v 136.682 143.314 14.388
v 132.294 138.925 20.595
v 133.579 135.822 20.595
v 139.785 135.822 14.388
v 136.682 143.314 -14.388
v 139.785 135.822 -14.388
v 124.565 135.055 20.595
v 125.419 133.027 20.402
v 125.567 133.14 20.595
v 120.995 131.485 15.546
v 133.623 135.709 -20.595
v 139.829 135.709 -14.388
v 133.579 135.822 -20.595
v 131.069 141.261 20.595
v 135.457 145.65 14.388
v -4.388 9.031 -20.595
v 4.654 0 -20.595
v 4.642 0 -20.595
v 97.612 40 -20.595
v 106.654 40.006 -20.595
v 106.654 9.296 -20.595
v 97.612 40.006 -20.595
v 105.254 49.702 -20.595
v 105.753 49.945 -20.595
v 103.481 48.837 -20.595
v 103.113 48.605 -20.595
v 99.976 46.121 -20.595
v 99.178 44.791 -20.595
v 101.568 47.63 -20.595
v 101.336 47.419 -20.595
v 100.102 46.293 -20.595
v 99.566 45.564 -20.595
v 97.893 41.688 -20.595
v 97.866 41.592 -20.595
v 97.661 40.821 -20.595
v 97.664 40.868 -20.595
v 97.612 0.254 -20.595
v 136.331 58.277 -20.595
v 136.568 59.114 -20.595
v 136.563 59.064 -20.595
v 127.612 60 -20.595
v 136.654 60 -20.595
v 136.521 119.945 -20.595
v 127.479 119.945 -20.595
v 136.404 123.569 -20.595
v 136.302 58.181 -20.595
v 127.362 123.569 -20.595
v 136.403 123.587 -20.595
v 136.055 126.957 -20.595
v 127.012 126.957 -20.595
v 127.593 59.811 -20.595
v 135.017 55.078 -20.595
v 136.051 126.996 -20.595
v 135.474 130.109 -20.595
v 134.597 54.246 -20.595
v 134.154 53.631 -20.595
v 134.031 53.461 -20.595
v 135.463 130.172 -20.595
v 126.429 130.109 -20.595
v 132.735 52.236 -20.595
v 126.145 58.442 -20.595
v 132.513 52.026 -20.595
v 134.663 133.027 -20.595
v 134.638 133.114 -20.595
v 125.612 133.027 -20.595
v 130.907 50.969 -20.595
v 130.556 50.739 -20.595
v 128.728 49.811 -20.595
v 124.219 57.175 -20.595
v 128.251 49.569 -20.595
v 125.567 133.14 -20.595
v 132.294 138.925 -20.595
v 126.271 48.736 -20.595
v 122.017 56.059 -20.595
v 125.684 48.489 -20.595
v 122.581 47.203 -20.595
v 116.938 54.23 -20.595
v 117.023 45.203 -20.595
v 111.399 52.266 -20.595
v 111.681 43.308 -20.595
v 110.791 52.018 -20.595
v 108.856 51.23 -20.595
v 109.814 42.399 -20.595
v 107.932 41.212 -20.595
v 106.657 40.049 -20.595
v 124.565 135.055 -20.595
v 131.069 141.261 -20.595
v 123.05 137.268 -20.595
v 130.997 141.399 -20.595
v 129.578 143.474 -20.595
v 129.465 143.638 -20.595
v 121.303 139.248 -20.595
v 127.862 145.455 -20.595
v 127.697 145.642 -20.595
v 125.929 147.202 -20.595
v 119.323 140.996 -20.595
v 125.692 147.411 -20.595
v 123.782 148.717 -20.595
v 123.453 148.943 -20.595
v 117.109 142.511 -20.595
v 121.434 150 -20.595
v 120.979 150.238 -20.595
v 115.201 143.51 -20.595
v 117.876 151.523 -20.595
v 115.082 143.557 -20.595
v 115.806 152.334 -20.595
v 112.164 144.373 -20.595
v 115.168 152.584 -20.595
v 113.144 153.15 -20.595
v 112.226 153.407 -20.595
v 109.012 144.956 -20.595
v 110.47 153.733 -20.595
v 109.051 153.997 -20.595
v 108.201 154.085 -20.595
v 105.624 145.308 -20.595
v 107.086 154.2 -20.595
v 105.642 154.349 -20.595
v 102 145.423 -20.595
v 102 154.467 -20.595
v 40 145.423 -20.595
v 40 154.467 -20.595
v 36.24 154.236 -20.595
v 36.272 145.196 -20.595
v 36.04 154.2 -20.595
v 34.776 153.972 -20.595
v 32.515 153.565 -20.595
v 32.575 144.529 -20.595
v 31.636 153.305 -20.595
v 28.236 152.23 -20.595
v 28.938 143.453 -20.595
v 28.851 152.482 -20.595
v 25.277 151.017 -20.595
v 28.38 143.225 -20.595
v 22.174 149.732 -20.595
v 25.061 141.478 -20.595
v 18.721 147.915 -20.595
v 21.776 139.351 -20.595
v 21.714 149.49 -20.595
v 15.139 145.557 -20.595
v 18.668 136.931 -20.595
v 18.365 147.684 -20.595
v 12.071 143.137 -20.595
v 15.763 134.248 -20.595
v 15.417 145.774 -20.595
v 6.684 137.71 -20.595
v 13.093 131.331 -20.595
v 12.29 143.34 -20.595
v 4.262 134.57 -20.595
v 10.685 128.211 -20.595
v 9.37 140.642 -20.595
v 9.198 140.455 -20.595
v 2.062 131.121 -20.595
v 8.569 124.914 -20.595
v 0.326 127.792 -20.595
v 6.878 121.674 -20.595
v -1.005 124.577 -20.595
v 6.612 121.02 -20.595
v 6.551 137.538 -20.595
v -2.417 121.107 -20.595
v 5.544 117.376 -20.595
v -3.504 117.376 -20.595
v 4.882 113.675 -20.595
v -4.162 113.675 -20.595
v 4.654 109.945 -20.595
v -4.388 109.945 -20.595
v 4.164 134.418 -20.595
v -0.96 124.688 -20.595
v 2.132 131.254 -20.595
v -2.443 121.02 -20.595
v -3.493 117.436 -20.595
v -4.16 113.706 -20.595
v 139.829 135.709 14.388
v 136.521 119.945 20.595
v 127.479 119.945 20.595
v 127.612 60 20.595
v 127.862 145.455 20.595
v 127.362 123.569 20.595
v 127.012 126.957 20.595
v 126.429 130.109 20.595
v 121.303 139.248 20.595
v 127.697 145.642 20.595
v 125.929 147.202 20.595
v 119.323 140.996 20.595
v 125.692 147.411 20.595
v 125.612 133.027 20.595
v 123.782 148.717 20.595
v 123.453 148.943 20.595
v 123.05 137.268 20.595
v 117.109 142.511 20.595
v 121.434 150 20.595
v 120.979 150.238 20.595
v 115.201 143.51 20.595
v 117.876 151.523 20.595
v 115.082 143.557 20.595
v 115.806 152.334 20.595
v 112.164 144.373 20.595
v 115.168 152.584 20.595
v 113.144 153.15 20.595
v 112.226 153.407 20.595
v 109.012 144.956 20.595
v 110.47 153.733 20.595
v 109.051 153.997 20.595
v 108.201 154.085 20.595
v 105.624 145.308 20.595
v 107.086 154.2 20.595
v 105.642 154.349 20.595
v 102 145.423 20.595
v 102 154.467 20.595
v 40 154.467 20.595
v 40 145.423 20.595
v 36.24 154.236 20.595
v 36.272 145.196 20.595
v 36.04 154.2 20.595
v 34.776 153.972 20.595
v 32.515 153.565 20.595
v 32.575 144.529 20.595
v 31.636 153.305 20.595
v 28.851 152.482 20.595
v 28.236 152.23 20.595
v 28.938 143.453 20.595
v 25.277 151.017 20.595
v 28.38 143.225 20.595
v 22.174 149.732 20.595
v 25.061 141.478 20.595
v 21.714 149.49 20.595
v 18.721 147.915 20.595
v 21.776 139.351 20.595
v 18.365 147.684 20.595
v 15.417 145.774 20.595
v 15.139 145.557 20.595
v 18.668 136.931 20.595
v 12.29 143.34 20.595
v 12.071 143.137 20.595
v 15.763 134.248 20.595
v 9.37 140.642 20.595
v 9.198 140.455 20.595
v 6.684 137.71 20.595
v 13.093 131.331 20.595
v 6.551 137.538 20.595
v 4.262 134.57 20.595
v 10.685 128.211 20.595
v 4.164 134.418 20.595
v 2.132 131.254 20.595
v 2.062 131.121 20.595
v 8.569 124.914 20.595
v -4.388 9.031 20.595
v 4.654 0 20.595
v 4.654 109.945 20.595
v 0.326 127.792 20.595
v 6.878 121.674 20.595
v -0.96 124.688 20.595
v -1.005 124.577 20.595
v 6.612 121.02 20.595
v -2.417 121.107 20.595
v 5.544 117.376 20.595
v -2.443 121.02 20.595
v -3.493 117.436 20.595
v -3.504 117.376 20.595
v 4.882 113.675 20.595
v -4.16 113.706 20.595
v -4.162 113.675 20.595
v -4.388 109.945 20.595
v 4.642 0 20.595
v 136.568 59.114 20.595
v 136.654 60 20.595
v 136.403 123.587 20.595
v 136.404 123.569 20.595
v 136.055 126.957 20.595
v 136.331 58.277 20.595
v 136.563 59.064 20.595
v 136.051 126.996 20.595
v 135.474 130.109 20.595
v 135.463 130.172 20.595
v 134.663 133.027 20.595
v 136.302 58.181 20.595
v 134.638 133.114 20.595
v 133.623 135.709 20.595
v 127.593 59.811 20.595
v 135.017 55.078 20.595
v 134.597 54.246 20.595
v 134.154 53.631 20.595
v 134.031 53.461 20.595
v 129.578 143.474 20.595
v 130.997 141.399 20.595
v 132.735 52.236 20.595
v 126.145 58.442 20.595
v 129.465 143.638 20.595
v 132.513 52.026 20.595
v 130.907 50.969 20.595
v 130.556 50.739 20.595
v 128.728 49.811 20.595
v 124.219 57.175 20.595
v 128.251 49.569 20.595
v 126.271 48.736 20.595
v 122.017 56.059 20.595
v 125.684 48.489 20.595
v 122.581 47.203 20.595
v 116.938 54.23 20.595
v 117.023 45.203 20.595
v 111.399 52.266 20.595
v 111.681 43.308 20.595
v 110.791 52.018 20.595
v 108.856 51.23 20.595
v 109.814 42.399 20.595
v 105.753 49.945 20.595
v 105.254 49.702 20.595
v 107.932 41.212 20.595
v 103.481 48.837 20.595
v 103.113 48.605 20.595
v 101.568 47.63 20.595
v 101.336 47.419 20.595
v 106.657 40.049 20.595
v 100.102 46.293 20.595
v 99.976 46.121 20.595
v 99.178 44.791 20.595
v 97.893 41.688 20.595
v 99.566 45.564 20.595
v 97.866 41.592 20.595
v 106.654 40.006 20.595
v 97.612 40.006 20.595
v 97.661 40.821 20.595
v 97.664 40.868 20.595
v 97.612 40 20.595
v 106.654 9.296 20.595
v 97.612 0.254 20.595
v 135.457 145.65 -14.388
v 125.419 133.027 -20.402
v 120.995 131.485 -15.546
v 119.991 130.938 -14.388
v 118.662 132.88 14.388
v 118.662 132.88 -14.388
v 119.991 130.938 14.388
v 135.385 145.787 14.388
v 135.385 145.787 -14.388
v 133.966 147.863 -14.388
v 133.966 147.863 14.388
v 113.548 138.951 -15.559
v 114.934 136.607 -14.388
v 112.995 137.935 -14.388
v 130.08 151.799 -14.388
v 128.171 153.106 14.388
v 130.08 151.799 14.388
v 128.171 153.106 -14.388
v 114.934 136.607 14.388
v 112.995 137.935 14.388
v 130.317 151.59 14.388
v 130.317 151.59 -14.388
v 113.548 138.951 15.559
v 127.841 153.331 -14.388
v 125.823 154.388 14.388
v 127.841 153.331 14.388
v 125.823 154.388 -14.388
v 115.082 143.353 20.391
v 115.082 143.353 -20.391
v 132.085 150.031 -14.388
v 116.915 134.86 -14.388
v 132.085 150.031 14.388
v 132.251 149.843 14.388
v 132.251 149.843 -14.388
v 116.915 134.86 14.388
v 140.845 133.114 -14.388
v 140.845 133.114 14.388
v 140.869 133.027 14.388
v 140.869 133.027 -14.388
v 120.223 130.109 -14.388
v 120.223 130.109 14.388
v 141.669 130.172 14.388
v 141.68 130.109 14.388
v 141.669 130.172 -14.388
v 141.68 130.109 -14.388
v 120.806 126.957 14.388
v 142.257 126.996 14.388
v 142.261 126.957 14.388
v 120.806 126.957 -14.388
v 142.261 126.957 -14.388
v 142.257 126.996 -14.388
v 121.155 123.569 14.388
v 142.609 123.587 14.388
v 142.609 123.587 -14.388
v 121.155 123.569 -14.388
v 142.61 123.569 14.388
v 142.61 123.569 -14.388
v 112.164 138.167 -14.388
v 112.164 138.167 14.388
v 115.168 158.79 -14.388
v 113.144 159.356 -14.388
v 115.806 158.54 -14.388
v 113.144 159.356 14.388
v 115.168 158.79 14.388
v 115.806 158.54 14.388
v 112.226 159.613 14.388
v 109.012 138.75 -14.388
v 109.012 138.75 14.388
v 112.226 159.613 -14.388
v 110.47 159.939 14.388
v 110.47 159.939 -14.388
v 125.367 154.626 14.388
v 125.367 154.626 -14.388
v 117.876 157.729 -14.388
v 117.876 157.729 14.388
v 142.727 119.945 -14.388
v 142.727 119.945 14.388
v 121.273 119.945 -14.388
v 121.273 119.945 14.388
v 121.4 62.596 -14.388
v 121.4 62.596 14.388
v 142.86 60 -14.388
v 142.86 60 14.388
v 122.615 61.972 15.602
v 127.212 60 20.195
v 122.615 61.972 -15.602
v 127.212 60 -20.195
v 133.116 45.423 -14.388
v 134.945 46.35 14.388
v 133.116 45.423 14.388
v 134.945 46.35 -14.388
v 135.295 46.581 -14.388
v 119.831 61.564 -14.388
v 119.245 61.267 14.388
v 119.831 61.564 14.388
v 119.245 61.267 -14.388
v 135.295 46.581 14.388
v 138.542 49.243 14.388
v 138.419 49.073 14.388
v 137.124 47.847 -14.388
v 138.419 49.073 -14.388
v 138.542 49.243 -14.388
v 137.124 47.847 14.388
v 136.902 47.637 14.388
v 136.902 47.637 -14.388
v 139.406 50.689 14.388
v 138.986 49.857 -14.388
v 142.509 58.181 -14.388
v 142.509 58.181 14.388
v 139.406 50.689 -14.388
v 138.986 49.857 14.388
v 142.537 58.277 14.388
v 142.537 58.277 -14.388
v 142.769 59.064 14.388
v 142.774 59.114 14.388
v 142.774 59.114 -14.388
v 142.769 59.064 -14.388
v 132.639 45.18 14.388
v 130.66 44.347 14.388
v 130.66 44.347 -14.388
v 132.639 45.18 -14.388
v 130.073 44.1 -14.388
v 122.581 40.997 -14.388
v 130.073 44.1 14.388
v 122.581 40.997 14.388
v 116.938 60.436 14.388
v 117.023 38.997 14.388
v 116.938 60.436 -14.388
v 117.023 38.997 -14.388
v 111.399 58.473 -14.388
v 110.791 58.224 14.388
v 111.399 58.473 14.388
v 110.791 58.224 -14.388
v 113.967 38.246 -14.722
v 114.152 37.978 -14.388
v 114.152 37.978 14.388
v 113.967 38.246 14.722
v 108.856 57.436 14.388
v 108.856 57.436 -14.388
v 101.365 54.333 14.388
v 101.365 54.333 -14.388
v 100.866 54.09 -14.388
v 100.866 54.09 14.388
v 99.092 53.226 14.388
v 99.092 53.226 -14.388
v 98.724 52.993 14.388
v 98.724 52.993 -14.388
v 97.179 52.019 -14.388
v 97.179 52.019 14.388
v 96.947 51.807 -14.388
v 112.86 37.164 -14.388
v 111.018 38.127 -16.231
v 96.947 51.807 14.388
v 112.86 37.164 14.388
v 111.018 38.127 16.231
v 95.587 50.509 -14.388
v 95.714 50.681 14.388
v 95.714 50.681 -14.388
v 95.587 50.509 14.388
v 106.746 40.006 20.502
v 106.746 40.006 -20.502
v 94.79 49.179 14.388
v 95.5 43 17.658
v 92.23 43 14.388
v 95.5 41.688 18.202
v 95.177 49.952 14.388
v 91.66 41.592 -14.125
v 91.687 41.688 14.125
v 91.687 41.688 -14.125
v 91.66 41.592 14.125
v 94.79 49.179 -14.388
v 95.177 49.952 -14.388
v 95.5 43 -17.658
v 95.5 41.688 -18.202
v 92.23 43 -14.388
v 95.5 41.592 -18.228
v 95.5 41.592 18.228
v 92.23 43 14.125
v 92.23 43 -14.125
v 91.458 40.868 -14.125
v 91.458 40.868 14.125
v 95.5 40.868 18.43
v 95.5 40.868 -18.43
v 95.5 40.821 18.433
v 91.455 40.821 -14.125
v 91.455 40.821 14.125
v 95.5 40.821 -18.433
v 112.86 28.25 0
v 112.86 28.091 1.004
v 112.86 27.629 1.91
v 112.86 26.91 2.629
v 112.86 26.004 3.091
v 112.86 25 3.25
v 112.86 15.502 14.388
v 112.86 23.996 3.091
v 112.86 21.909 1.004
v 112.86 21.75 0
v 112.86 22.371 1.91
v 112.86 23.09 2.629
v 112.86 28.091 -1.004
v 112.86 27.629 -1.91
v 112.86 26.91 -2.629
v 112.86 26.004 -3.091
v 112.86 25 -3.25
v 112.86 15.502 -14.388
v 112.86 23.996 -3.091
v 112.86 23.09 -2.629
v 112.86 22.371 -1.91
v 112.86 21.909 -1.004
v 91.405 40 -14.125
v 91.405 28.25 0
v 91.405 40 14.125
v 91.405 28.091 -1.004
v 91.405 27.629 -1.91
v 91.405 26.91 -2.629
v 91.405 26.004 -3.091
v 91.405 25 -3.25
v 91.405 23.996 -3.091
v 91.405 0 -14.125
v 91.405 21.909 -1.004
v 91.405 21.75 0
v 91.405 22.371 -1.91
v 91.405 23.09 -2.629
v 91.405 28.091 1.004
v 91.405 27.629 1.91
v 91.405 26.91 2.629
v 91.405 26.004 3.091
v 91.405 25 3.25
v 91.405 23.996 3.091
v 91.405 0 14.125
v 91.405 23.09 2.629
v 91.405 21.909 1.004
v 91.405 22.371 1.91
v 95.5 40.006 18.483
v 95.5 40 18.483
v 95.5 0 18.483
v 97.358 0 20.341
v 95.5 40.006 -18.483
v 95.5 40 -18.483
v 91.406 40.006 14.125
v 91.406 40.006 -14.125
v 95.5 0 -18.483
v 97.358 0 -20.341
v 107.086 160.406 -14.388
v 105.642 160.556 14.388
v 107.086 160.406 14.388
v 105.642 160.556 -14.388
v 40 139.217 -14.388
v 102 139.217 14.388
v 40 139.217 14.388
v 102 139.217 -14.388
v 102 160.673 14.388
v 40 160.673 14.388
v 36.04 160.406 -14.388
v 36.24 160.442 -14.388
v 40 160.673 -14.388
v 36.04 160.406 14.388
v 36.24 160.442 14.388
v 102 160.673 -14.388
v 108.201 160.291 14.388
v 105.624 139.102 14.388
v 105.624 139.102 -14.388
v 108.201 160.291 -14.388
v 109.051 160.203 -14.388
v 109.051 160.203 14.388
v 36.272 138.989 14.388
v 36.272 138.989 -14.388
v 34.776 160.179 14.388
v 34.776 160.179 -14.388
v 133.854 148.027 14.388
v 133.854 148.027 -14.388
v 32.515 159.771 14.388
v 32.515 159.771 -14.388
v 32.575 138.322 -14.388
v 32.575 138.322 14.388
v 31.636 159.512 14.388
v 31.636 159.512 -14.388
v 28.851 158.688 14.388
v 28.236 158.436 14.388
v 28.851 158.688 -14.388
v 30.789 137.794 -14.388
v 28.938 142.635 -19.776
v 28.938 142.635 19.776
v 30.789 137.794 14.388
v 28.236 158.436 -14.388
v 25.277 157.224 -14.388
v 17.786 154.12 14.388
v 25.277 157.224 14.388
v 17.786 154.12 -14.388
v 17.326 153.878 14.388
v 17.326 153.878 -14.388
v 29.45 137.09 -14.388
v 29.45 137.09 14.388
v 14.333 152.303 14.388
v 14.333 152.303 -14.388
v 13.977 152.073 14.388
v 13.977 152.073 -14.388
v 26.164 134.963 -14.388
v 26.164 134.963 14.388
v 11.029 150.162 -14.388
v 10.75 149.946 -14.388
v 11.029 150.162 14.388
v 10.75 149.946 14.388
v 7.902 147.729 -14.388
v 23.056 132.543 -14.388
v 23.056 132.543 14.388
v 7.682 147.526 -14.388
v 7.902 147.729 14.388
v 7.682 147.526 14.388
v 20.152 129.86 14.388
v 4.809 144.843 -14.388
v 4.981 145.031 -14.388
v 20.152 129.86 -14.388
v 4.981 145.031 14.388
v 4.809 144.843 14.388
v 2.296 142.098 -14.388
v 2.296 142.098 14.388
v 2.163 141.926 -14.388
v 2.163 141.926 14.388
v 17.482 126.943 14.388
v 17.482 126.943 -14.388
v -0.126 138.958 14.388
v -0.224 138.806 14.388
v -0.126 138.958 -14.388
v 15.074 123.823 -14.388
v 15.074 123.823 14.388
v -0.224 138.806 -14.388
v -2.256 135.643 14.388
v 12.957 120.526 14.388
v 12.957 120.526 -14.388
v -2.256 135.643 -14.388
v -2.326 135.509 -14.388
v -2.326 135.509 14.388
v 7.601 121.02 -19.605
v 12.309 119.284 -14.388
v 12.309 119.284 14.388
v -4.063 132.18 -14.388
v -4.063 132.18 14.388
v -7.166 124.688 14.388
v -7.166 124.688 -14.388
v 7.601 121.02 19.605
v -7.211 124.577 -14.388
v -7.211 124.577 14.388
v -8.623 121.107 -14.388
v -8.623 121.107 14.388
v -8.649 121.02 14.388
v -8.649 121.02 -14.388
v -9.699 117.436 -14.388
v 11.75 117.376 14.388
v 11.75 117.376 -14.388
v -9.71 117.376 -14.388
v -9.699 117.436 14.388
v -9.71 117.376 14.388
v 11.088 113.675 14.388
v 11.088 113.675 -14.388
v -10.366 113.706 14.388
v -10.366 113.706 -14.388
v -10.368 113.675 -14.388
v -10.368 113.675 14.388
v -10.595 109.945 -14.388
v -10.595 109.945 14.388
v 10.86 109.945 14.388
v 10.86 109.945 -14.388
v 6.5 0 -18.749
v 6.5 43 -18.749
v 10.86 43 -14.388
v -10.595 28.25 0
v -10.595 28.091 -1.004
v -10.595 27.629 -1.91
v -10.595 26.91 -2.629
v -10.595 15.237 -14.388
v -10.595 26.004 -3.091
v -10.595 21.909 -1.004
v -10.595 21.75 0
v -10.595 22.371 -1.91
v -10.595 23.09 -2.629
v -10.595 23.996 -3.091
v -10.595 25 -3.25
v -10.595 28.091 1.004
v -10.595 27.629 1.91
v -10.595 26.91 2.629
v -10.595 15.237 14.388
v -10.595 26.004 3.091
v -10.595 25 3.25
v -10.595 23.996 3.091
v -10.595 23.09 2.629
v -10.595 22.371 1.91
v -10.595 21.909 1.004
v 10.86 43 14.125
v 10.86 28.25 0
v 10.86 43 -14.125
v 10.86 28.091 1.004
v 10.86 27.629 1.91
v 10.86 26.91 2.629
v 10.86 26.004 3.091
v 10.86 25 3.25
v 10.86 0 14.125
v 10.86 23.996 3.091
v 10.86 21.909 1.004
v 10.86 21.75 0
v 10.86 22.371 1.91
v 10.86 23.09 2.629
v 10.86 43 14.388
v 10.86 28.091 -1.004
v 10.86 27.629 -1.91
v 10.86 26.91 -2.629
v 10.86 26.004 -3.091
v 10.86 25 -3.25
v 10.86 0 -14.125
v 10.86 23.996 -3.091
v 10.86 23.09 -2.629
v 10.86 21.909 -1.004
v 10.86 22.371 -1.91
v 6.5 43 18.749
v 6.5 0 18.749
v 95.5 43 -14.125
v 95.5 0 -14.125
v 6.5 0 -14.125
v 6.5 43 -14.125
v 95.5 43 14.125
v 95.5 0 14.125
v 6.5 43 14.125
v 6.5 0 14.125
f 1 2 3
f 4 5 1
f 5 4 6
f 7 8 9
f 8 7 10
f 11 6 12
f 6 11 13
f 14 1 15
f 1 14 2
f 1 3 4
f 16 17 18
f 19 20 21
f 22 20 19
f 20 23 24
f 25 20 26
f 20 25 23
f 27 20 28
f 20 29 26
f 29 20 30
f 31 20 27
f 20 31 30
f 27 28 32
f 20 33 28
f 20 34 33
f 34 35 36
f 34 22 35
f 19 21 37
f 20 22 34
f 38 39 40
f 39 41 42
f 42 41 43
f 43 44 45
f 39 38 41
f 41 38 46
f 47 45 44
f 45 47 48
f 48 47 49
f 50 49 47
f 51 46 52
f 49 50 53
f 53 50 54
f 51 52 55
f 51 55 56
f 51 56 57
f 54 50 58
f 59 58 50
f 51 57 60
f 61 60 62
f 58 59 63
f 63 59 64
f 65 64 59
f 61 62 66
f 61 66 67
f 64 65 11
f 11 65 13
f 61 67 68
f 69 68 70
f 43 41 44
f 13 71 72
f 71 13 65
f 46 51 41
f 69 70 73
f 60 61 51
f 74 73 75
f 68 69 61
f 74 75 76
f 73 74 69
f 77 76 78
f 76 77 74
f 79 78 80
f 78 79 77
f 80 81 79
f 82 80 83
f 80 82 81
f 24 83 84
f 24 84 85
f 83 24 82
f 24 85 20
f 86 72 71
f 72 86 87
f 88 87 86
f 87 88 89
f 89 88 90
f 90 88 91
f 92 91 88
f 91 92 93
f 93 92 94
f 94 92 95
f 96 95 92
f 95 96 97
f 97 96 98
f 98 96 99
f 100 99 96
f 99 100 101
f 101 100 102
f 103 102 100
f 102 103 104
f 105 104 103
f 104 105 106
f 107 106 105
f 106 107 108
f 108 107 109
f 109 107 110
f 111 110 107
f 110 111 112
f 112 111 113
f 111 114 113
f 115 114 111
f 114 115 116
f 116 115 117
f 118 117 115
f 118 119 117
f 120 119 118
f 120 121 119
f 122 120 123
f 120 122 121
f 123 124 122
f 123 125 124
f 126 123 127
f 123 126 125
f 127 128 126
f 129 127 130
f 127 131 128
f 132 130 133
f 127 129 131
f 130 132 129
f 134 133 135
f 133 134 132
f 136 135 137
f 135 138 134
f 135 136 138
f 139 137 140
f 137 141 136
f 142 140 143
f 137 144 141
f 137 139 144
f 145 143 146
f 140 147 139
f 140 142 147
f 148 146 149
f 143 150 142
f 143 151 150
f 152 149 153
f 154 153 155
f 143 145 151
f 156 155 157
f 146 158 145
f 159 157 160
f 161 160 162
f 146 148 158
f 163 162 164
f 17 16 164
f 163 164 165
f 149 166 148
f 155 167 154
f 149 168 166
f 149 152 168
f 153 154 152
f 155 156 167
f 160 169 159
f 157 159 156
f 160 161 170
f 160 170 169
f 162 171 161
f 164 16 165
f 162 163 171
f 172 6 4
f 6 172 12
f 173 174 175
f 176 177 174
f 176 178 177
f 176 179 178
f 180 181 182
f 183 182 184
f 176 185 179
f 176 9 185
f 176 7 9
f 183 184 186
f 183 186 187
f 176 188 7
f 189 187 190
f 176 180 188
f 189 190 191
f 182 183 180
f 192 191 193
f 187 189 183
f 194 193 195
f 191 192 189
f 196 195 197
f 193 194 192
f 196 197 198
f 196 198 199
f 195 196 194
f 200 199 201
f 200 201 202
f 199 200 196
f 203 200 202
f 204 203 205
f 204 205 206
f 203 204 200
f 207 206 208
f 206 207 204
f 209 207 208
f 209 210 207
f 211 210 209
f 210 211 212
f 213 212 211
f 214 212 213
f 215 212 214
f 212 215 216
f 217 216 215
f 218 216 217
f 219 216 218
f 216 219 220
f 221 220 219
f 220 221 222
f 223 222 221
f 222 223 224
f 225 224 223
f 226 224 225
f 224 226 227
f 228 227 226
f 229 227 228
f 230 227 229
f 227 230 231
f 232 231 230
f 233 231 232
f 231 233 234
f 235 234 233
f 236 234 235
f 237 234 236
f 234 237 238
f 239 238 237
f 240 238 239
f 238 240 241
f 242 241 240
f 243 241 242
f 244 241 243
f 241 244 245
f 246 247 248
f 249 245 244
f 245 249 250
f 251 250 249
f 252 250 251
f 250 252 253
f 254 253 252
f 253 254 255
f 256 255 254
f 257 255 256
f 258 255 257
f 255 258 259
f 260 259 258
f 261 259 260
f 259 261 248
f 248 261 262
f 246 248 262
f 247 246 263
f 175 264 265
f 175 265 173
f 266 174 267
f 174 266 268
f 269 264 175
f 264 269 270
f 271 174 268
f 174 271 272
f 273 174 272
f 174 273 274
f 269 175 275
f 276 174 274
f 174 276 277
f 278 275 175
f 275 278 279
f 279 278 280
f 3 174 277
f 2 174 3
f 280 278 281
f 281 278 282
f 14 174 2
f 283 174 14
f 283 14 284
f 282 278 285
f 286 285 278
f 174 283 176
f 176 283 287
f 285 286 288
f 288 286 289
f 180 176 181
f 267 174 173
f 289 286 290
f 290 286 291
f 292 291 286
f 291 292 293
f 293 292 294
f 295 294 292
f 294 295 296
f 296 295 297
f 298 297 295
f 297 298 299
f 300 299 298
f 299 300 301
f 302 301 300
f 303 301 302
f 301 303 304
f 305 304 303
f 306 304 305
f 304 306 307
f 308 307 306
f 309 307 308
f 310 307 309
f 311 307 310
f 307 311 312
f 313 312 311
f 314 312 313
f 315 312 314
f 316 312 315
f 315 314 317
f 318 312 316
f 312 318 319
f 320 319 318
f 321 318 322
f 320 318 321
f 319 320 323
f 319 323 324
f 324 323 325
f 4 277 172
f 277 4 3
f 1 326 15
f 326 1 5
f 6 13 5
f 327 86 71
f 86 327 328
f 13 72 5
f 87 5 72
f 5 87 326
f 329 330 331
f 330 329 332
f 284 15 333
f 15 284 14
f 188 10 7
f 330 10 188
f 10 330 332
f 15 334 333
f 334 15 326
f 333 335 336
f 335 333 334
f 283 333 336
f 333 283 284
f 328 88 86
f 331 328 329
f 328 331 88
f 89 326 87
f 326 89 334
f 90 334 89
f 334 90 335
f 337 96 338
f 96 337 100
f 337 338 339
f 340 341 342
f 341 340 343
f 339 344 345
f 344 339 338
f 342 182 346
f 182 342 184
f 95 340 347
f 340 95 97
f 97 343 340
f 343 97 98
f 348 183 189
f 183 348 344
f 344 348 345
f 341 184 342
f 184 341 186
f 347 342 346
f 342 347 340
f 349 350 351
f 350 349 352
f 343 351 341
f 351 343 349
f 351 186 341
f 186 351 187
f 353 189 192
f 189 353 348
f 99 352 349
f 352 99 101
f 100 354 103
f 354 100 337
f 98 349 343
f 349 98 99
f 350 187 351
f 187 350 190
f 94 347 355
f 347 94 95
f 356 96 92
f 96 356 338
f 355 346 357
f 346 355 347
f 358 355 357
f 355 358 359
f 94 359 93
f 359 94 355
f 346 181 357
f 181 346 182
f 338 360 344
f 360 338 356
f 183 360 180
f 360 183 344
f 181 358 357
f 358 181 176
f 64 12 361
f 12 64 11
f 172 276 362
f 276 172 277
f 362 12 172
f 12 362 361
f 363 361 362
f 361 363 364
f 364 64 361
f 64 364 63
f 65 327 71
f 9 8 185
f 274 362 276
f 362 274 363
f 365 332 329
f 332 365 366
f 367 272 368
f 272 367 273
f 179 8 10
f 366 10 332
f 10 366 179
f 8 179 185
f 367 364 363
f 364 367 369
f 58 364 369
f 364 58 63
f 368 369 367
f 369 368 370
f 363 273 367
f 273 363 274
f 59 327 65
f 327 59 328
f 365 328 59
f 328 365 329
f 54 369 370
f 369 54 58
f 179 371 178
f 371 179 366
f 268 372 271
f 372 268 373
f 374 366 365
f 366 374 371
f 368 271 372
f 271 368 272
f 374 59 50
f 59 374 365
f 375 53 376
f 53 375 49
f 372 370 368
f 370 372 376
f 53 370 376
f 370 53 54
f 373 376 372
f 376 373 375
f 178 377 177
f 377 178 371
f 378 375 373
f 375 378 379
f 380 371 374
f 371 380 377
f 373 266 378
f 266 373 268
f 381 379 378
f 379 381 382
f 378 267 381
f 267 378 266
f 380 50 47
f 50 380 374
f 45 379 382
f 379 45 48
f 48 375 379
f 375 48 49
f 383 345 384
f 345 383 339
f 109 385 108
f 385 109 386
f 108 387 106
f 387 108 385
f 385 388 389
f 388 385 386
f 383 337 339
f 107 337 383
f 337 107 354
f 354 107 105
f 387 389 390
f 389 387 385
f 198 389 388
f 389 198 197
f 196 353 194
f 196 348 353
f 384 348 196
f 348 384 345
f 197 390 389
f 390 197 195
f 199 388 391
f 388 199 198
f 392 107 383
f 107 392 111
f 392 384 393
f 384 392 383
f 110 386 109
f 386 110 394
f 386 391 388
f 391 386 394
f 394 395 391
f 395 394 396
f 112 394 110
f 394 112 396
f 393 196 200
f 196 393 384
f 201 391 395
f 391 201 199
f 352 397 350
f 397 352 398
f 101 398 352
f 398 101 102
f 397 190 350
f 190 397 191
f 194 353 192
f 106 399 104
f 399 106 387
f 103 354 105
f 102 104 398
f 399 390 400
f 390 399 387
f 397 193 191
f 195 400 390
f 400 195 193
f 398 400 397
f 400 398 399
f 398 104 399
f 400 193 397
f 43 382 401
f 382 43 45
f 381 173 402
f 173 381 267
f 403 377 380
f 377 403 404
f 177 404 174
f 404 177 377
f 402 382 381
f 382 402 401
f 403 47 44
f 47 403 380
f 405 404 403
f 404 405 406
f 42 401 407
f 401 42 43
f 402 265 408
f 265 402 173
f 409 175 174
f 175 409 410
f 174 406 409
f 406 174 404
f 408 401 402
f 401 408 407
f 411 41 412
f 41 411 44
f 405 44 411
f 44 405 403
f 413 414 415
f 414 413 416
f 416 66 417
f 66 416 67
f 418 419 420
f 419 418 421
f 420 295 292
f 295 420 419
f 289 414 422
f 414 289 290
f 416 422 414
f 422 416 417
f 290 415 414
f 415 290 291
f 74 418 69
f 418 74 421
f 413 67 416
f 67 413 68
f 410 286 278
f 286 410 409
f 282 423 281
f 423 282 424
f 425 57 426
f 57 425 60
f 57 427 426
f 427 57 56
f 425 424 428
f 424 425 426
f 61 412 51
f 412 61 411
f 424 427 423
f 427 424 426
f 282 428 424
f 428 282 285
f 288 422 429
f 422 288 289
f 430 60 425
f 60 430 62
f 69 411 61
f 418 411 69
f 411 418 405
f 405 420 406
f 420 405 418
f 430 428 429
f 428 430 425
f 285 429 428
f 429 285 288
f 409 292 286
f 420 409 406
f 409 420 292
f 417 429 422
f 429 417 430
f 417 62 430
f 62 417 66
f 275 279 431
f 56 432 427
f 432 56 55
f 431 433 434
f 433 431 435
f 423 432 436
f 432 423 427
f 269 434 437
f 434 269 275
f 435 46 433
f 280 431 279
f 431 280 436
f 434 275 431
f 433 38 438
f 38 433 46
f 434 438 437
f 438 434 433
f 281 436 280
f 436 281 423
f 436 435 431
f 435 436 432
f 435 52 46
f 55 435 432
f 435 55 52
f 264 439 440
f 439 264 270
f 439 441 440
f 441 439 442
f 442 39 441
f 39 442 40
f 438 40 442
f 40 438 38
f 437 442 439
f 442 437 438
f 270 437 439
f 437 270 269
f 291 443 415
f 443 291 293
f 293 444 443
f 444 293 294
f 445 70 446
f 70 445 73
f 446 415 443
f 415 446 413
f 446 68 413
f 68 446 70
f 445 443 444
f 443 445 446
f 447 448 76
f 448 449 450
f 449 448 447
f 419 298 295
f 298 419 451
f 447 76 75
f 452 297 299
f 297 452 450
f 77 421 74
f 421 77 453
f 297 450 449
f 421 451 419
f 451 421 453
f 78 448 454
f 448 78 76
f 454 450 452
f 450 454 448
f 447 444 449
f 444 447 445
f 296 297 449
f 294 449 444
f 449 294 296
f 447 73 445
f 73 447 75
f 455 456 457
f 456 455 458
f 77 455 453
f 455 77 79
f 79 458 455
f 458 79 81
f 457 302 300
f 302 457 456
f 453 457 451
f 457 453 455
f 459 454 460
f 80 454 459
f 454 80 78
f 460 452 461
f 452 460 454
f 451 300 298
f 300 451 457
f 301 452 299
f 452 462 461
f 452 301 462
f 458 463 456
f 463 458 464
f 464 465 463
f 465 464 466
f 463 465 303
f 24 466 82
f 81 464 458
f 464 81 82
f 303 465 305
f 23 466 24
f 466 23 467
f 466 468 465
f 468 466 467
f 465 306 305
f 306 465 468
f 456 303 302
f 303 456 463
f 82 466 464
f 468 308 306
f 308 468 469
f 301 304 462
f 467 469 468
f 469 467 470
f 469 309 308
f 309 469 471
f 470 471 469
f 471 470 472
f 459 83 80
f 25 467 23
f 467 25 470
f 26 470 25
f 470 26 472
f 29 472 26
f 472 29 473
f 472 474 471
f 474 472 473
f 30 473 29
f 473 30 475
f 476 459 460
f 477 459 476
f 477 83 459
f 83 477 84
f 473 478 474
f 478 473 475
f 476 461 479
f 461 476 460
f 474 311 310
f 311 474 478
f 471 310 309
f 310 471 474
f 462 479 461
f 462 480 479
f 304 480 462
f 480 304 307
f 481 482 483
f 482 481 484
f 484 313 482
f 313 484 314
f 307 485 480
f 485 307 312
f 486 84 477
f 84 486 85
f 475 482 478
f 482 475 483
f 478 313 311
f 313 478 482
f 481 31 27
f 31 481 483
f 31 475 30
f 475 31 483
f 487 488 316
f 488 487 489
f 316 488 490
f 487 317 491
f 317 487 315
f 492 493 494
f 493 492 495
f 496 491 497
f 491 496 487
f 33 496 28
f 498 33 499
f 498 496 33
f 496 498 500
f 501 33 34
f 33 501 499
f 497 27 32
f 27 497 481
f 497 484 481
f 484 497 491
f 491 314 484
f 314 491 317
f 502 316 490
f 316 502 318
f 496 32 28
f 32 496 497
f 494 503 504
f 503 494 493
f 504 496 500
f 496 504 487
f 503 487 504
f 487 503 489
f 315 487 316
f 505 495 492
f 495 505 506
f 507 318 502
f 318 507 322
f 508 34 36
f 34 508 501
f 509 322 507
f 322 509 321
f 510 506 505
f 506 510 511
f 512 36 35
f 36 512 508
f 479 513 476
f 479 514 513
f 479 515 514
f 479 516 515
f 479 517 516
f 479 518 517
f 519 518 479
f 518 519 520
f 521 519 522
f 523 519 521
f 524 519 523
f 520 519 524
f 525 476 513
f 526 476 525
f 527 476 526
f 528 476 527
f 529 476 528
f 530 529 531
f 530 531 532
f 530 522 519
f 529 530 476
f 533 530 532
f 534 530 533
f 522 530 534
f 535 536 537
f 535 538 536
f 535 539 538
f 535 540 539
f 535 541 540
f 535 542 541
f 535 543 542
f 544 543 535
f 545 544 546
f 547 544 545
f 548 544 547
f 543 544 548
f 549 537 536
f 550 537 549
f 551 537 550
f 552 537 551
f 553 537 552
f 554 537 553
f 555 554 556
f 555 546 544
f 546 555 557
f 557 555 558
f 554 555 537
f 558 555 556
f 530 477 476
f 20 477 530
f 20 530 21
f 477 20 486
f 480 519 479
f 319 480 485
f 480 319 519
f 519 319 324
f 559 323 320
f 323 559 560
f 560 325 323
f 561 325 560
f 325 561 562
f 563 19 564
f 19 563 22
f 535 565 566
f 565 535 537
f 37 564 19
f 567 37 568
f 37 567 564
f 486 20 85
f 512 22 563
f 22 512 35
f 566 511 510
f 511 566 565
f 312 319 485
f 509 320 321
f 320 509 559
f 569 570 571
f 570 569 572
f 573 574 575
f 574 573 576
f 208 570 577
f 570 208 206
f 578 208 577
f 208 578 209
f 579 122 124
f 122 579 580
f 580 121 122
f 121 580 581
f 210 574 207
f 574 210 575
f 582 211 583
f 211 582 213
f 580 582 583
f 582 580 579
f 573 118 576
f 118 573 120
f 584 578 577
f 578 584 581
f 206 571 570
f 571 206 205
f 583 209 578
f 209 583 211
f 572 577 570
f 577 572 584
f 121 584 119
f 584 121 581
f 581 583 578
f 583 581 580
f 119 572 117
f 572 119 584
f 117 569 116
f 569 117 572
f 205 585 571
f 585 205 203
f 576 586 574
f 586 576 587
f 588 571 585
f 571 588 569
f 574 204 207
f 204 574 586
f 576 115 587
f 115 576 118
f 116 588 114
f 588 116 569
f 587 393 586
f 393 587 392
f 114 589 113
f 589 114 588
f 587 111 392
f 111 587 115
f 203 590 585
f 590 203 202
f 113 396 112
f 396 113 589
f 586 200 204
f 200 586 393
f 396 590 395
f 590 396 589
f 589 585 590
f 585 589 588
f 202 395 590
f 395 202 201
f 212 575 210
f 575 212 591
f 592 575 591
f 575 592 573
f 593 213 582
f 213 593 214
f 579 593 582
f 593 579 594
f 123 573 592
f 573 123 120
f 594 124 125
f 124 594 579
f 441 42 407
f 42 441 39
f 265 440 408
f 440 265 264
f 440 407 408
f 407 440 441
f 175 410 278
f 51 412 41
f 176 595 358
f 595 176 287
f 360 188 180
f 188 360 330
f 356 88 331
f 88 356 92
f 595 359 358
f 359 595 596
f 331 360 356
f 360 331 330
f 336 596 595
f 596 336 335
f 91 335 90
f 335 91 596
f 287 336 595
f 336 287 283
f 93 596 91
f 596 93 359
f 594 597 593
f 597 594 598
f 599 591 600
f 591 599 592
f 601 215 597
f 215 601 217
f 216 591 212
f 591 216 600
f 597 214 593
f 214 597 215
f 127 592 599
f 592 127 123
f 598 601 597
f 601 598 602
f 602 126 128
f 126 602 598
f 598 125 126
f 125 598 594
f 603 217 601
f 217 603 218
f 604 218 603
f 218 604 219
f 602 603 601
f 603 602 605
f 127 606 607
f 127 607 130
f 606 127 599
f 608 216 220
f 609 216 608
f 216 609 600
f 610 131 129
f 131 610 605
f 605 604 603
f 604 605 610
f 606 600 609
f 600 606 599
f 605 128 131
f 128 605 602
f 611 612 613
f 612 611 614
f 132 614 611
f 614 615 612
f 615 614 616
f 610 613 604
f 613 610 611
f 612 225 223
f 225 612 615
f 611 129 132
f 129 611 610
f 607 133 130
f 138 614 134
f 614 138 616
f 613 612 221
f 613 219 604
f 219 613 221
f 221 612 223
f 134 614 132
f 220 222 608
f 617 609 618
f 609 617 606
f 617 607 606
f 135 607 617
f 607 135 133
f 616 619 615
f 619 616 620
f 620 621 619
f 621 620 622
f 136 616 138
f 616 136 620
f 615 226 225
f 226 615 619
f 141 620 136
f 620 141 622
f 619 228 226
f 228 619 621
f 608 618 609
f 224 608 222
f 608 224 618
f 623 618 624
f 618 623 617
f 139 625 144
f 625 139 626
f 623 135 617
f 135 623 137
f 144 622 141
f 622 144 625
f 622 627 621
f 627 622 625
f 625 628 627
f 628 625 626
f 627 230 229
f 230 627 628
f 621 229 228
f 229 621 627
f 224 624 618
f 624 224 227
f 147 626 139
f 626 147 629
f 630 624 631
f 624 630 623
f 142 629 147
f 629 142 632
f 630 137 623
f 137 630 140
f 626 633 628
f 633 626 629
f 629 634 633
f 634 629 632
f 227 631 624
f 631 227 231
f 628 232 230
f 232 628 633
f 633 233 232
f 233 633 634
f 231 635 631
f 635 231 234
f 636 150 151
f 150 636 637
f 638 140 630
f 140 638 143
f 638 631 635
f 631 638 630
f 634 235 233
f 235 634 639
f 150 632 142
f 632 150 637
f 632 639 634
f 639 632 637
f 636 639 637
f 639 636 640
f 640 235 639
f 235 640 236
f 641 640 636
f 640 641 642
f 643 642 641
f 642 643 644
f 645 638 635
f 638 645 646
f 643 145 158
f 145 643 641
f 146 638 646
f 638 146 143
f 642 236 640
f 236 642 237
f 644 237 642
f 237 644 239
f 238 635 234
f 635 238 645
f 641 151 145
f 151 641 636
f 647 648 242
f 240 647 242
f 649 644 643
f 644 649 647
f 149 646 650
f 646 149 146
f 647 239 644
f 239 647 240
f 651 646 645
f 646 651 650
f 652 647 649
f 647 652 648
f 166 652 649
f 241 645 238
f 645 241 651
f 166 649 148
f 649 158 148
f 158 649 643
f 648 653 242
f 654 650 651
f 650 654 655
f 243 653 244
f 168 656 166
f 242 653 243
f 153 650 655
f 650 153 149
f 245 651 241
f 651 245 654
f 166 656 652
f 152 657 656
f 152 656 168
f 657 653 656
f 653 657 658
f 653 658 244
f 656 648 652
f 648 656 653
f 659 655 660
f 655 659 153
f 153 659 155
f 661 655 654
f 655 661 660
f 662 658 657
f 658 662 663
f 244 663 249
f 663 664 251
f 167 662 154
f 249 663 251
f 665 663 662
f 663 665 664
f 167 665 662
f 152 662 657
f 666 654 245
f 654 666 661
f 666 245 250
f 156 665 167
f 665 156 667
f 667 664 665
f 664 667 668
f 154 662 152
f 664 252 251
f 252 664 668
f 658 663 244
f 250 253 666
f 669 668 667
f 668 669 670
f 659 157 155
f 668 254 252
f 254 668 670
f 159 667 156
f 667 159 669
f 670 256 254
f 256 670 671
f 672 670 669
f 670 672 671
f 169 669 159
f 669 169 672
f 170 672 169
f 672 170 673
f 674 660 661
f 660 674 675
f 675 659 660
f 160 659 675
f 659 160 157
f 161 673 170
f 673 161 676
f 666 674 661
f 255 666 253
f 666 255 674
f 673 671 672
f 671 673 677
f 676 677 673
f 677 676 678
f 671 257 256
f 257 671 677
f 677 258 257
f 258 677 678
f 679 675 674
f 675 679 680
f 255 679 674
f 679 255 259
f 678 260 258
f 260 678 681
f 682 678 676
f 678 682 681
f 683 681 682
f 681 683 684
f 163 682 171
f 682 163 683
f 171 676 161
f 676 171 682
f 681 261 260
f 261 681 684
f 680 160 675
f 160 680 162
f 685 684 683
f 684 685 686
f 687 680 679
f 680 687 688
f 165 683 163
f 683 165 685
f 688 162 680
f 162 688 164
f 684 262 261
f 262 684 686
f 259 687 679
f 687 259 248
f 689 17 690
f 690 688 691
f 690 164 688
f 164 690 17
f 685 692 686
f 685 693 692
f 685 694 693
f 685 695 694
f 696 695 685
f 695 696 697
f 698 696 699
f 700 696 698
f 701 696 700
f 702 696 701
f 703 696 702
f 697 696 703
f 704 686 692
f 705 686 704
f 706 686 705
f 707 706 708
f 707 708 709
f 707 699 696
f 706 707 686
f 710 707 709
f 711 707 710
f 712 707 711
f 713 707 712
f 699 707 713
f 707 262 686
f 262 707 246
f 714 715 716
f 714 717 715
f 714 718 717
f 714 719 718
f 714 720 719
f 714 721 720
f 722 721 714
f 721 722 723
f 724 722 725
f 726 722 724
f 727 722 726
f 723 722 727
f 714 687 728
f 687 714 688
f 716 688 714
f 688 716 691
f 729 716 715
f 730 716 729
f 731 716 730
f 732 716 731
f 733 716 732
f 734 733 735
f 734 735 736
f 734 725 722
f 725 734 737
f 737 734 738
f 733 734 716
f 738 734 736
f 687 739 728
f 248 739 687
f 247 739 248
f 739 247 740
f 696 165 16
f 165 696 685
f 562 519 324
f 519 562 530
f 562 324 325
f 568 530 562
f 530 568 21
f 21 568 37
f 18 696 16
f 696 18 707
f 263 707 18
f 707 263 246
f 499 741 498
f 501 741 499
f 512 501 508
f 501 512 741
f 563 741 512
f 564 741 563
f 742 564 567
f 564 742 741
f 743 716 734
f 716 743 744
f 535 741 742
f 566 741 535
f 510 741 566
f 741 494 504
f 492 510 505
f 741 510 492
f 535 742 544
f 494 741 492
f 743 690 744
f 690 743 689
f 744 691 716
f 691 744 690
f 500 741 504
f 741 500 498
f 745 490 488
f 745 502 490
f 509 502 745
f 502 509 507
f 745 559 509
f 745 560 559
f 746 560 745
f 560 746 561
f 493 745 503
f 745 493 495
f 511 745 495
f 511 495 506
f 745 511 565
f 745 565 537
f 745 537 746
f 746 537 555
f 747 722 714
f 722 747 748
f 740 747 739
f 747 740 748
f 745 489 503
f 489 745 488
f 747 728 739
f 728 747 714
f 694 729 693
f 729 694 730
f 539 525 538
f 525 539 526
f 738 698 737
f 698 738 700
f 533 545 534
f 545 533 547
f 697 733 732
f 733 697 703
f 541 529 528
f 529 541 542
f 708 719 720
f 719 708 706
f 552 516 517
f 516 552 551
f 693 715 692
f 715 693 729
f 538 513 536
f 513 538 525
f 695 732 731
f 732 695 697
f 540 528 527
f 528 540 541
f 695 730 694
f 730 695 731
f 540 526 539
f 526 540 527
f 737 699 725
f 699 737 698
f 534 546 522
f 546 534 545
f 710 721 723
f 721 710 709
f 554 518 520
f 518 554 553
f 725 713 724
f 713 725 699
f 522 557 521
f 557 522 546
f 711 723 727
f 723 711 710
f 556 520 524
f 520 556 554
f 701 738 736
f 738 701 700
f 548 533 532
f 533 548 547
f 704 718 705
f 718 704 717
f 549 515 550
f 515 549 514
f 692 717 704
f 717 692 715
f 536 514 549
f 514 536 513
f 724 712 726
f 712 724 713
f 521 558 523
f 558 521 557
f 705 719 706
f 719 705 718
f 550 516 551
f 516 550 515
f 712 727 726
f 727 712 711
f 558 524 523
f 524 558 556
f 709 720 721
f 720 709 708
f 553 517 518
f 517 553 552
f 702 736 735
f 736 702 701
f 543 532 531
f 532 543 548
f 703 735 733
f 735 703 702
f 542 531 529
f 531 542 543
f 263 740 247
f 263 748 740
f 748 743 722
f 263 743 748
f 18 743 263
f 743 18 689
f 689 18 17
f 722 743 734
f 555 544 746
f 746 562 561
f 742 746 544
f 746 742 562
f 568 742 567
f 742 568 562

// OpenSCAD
WALL = 18;
TH   = 36  +2;
CH   = TH/4 * (1 + (sqrt(2)-1)/2);

ATOM = 0.01;

module handle0() {
    minkowski() {
        th = TH - WALL;
        translate([0, 297, -th/2])
        scale([1, -1, 1])
        linear_extrude(th)
        import("handle-spine.dxf");

        sphere(r=CH, $fn=8);
    }

    //%translate([WALL/2 *1.1, 0, -WALL/2]) cube([82, 82, TH]);
}

module handle() {
    difference() {
        translate([0, -0, 0])
        handle0();
        
        // screw axis       
        translate([0, 25, 0])
        rotate([0, 90, 0]) {
            cylinder(d=6.5, h=500, $fn=20, center=true);
            %cylinder(d=6.5, h=500, $fn=20, center=true);
        }
        
        // Ends
        translate([0, -10, 0])
        cube([400, 20, WALL*4], center=true);

        // slants
        for (k=[1, -1]) {
            translate([102/2, -102/2-TH*.25, 0])
            rotate([0, 0, k*45])
            cube([400, 20, WALL*4], center=true);
        }
        
        // grooves
        dz = 28 + 2.25;
        for (k=[-1, 1]) {
            translate([TH/4 -3, -.5, k*(dz/2) -1])
            cube([82+4 +3, 43.5, 2]);

            translate([TH/4 -3, -.5, k*(dz/2+2) -2.5])
            cube([82+4 +3, 43.5, 5]);

        }
    }
}

handle();

/*
translate([0, 0, -6])
intersection() {
    handle();
    translate([0, 0, 6])
    cylinder(r=1000, h=.5);
}


translate([50, 0, .5])
rotate([0, 90, 0])
translate([-1-94, 0, 0])
intersection() {
    handle();

    translate([93, 0, 0])
    cube([5, 100, 100], center=true);
}
*/
